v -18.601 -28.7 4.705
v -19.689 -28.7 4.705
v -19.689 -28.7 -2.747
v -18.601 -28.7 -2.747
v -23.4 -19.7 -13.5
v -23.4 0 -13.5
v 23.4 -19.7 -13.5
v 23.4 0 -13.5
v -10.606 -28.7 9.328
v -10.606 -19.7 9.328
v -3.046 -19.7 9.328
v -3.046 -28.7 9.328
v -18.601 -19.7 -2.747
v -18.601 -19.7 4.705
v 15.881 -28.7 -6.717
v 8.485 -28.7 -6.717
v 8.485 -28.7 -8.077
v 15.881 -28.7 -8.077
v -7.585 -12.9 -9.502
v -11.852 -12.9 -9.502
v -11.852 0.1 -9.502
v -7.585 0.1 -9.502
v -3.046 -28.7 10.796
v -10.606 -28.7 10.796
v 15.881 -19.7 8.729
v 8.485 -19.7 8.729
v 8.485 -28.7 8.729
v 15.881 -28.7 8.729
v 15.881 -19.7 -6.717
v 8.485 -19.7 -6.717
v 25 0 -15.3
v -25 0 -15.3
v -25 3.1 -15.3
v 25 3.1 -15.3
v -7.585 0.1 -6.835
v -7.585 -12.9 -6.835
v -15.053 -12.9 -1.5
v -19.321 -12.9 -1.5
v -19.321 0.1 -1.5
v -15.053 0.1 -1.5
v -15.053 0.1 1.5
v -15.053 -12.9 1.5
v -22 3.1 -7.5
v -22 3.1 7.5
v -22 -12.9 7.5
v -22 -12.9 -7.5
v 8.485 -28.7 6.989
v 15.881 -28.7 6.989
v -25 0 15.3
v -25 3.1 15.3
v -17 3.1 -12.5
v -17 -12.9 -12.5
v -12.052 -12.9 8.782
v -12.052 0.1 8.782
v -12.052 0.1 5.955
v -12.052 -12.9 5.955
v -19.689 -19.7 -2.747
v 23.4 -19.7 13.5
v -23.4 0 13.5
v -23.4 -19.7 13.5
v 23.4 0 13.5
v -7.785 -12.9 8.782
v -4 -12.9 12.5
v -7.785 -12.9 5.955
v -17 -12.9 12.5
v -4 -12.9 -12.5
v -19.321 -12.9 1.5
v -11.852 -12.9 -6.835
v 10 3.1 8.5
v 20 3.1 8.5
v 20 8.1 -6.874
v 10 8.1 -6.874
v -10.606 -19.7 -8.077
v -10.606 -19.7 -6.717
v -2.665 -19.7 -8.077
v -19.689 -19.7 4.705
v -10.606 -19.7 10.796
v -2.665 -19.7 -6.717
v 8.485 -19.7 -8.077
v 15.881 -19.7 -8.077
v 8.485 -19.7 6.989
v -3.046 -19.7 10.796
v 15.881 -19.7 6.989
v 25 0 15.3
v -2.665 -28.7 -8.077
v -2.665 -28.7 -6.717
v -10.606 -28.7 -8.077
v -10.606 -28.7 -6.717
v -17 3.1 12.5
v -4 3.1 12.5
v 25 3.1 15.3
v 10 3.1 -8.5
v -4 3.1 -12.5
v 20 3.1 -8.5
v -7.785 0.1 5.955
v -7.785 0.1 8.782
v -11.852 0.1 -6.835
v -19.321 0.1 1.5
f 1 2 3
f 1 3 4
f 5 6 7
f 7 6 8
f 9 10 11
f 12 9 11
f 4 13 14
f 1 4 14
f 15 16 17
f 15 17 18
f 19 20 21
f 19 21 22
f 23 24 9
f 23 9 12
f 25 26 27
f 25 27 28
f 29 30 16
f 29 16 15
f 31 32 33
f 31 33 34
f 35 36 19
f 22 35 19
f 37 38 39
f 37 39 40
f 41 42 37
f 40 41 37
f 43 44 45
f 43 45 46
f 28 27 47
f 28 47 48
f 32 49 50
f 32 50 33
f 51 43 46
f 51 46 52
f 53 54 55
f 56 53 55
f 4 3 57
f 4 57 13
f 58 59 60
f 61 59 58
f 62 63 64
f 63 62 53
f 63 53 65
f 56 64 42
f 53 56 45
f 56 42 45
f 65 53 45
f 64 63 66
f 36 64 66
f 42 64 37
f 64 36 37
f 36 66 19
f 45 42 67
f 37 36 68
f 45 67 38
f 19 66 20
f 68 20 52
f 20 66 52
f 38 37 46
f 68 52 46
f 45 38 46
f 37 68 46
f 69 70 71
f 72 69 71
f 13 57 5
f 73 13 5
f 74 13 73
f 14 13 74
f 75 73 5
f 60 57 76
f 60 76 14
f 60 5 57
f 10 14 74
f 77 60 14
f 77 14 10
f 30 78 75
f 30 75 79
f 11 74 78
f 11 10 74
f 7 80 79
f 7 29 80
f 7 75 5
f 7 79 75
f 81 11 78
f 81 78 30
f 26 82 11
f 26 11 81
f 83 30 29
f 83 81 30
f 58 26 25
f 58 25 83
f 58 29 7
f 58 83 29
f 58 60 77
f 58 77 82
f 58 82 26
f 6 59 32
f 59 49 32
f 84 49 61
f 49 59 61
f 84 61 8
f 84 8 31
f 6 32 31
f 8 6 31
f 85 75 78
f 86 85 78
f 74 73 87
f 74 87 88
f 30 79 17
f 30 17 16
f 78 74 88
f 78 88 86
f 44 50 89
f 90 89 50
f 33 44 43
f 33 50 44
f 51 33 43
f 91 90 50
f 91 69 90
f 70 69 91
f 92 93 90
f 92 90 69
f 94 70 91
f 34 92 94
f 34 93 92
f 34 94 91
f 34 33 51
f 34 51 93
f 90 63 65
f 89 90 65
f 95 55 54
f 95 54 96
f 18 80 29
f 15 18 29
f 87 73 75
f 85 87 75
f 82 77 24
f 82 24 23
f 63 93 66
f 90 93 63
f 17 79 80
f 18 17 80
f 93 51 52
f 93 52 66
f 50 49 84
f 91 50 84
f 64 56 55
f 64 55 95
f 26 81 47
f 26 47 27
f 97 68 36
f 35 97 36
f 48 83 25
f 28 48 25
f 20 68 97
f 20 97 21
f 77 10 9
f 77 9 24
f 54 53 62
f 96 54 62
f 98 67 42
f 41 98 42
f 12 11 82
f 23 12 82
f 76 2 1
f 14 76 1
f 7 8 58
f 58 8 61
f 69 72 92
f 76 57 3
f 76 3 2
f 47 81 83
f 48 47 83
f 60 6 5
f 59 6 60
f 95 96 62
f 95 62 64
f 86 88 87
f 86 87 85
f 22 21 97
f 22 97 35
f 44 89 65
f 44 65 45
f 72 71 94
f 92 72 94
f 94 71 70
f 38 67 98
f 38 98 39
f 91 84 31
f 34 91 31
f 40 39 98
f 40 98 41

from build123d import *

# Parameters (mm, degrees)
SKETCH_1_W          = 50
SKETCH_1_H          = 30.6
EXTRUDE_1_DEPTH     = 3.1
SKETCH_2_W          = 46.8
SKETCH_2_H          = 27
EXTRUDE_2_DEPTH     = 19.7
CUT_EXTRUDE_1_DEPTH = 16
SKETCH_4_W          = 4.267620073
SKETCH_4_H          = 3.000670364
SKETCH_4_W_2        = 4.267620072
SKETCH_4_H_2        = 2.667262545
SKETCH_4_H_3        = 2.826910105
EXTRUDE_3_DEPTH     = 13
EXTRUDE_START       = -5
EXTRUDE_4_DEPTH     = 10
SKETCH_6_W          = 1.087762737
SKETCH_6_H          = 7.451174749
SKETCH_6_W_2        = 7.559951024
SKETCH_6_H_2        = 1.468479696
SKETCH_6_W_3        = 7.940667982
SKETCH_6_H_3        = 1.359703422
SKETCH_6_W_4        = 7.396786613
SKETCH_6_H_4        = 1.74042038
EXTRUDE_5_DEPTH     = 9


with BuildPart() as part:
    # 草图1 → 凸台-拉伸1 (new body)
    with BuildSketch(Plane(origin=(0, 0, 0), x_dir=(1, 0, 0), z_dir=(0, 1, 0))):
        Rectangle(SKETCH_1_W, SKETCH_1_H)
    extrude(amount=EXTRUDE_1_DEPTH)

    # 草图2 → 凸台-拉伸2 (add)
    with BuildSketch(Plane.XZ):
        Rectangle(SKETCH_2_W, SKETCH_2_H)
    extrude(amount=EXTRUDE_2_DEPTH)

    # 草图3 → 切除-拉伸1 (cut)
    with BuildSketch(Plane(origin=(0, 3.1, 0), x_dir=(1, 0, 0), z_dir=(0, 1, 0))):
        Polygon((-17, 12.5), (-4, 12.5), (-4, -12.5), (-17, -12.5), (-22, -7.5), (-22, 7.5), align=None)
    extrude(amount=-CUT_EXTRUDE_1_DEPTH, mode=Mode.SUBTRACT)

    # 草图4 → 凸台-拉伸3 (add)
    with BuildSketch(Plane(origin=(0, -12.9, 0), x_dir=(1, 0, 0), z_dir=(0, 1, 0))):
        with Locations((-17.186695536, 0)):
            Rectangle(SKETCH_4_W, SKETCH_4_H)
        with Locations((-9.718360408, 8.168491546)):
            Rectangle(SKETCH_4_W_2, SKETCH_4_H_2)
        with Locations((-9.918405099, -7.368312782)):
            Rectangle(SKETCH_4_W_2, SKETCH_4_H_3)
    extrude(amount=EXTRUDE_3_DEPTH)

    # 草图5 → 凸台-拉伸4 (add)
    with BuildSketch(Plane(origin=(25, 0, 0), x_dir=(0, 0, -1), z_dir=(1, 0, 0)).offset(EXTRUDE_START)):
        Polygon((-8.5, 3.1), (6.873863542, 8.1), (8.5, 3.1), align=None)
    extrude(amount=-EXTRUDE_4_DEPTH)

    # 草图6 → 凸台-拉伸5 (add)
    with BuildSketch(Plane.XZ.offset(19.7)):
        with Locations((-19.144624175, 0.978986463)):
            Rectangle(SKETCH_6_W, SKETCH_6_H)
        with Locations((-6.825711176, 10.061805319)):
            Rectangle(SKETCH_6_W_2, SKETCH_6_H_2)
        with Locations((-6.635352697, -7.396786613)):
            Rectangle(SKETCH_6_W_3, SKETCH_6_H_3)
        with Locations((12.182942656, 7.859085776)):
            Rectangle(SKETCH_6_W_4, SKETCH_6_H_4)
        with Locations((12.182942656, -7.396786613)):
            Rectangle(SKETCH_6_W_4, SKETCH_6_H_3)
    extrude(amount=EXTRUDE_5_DEPTH)


solid = part.part
